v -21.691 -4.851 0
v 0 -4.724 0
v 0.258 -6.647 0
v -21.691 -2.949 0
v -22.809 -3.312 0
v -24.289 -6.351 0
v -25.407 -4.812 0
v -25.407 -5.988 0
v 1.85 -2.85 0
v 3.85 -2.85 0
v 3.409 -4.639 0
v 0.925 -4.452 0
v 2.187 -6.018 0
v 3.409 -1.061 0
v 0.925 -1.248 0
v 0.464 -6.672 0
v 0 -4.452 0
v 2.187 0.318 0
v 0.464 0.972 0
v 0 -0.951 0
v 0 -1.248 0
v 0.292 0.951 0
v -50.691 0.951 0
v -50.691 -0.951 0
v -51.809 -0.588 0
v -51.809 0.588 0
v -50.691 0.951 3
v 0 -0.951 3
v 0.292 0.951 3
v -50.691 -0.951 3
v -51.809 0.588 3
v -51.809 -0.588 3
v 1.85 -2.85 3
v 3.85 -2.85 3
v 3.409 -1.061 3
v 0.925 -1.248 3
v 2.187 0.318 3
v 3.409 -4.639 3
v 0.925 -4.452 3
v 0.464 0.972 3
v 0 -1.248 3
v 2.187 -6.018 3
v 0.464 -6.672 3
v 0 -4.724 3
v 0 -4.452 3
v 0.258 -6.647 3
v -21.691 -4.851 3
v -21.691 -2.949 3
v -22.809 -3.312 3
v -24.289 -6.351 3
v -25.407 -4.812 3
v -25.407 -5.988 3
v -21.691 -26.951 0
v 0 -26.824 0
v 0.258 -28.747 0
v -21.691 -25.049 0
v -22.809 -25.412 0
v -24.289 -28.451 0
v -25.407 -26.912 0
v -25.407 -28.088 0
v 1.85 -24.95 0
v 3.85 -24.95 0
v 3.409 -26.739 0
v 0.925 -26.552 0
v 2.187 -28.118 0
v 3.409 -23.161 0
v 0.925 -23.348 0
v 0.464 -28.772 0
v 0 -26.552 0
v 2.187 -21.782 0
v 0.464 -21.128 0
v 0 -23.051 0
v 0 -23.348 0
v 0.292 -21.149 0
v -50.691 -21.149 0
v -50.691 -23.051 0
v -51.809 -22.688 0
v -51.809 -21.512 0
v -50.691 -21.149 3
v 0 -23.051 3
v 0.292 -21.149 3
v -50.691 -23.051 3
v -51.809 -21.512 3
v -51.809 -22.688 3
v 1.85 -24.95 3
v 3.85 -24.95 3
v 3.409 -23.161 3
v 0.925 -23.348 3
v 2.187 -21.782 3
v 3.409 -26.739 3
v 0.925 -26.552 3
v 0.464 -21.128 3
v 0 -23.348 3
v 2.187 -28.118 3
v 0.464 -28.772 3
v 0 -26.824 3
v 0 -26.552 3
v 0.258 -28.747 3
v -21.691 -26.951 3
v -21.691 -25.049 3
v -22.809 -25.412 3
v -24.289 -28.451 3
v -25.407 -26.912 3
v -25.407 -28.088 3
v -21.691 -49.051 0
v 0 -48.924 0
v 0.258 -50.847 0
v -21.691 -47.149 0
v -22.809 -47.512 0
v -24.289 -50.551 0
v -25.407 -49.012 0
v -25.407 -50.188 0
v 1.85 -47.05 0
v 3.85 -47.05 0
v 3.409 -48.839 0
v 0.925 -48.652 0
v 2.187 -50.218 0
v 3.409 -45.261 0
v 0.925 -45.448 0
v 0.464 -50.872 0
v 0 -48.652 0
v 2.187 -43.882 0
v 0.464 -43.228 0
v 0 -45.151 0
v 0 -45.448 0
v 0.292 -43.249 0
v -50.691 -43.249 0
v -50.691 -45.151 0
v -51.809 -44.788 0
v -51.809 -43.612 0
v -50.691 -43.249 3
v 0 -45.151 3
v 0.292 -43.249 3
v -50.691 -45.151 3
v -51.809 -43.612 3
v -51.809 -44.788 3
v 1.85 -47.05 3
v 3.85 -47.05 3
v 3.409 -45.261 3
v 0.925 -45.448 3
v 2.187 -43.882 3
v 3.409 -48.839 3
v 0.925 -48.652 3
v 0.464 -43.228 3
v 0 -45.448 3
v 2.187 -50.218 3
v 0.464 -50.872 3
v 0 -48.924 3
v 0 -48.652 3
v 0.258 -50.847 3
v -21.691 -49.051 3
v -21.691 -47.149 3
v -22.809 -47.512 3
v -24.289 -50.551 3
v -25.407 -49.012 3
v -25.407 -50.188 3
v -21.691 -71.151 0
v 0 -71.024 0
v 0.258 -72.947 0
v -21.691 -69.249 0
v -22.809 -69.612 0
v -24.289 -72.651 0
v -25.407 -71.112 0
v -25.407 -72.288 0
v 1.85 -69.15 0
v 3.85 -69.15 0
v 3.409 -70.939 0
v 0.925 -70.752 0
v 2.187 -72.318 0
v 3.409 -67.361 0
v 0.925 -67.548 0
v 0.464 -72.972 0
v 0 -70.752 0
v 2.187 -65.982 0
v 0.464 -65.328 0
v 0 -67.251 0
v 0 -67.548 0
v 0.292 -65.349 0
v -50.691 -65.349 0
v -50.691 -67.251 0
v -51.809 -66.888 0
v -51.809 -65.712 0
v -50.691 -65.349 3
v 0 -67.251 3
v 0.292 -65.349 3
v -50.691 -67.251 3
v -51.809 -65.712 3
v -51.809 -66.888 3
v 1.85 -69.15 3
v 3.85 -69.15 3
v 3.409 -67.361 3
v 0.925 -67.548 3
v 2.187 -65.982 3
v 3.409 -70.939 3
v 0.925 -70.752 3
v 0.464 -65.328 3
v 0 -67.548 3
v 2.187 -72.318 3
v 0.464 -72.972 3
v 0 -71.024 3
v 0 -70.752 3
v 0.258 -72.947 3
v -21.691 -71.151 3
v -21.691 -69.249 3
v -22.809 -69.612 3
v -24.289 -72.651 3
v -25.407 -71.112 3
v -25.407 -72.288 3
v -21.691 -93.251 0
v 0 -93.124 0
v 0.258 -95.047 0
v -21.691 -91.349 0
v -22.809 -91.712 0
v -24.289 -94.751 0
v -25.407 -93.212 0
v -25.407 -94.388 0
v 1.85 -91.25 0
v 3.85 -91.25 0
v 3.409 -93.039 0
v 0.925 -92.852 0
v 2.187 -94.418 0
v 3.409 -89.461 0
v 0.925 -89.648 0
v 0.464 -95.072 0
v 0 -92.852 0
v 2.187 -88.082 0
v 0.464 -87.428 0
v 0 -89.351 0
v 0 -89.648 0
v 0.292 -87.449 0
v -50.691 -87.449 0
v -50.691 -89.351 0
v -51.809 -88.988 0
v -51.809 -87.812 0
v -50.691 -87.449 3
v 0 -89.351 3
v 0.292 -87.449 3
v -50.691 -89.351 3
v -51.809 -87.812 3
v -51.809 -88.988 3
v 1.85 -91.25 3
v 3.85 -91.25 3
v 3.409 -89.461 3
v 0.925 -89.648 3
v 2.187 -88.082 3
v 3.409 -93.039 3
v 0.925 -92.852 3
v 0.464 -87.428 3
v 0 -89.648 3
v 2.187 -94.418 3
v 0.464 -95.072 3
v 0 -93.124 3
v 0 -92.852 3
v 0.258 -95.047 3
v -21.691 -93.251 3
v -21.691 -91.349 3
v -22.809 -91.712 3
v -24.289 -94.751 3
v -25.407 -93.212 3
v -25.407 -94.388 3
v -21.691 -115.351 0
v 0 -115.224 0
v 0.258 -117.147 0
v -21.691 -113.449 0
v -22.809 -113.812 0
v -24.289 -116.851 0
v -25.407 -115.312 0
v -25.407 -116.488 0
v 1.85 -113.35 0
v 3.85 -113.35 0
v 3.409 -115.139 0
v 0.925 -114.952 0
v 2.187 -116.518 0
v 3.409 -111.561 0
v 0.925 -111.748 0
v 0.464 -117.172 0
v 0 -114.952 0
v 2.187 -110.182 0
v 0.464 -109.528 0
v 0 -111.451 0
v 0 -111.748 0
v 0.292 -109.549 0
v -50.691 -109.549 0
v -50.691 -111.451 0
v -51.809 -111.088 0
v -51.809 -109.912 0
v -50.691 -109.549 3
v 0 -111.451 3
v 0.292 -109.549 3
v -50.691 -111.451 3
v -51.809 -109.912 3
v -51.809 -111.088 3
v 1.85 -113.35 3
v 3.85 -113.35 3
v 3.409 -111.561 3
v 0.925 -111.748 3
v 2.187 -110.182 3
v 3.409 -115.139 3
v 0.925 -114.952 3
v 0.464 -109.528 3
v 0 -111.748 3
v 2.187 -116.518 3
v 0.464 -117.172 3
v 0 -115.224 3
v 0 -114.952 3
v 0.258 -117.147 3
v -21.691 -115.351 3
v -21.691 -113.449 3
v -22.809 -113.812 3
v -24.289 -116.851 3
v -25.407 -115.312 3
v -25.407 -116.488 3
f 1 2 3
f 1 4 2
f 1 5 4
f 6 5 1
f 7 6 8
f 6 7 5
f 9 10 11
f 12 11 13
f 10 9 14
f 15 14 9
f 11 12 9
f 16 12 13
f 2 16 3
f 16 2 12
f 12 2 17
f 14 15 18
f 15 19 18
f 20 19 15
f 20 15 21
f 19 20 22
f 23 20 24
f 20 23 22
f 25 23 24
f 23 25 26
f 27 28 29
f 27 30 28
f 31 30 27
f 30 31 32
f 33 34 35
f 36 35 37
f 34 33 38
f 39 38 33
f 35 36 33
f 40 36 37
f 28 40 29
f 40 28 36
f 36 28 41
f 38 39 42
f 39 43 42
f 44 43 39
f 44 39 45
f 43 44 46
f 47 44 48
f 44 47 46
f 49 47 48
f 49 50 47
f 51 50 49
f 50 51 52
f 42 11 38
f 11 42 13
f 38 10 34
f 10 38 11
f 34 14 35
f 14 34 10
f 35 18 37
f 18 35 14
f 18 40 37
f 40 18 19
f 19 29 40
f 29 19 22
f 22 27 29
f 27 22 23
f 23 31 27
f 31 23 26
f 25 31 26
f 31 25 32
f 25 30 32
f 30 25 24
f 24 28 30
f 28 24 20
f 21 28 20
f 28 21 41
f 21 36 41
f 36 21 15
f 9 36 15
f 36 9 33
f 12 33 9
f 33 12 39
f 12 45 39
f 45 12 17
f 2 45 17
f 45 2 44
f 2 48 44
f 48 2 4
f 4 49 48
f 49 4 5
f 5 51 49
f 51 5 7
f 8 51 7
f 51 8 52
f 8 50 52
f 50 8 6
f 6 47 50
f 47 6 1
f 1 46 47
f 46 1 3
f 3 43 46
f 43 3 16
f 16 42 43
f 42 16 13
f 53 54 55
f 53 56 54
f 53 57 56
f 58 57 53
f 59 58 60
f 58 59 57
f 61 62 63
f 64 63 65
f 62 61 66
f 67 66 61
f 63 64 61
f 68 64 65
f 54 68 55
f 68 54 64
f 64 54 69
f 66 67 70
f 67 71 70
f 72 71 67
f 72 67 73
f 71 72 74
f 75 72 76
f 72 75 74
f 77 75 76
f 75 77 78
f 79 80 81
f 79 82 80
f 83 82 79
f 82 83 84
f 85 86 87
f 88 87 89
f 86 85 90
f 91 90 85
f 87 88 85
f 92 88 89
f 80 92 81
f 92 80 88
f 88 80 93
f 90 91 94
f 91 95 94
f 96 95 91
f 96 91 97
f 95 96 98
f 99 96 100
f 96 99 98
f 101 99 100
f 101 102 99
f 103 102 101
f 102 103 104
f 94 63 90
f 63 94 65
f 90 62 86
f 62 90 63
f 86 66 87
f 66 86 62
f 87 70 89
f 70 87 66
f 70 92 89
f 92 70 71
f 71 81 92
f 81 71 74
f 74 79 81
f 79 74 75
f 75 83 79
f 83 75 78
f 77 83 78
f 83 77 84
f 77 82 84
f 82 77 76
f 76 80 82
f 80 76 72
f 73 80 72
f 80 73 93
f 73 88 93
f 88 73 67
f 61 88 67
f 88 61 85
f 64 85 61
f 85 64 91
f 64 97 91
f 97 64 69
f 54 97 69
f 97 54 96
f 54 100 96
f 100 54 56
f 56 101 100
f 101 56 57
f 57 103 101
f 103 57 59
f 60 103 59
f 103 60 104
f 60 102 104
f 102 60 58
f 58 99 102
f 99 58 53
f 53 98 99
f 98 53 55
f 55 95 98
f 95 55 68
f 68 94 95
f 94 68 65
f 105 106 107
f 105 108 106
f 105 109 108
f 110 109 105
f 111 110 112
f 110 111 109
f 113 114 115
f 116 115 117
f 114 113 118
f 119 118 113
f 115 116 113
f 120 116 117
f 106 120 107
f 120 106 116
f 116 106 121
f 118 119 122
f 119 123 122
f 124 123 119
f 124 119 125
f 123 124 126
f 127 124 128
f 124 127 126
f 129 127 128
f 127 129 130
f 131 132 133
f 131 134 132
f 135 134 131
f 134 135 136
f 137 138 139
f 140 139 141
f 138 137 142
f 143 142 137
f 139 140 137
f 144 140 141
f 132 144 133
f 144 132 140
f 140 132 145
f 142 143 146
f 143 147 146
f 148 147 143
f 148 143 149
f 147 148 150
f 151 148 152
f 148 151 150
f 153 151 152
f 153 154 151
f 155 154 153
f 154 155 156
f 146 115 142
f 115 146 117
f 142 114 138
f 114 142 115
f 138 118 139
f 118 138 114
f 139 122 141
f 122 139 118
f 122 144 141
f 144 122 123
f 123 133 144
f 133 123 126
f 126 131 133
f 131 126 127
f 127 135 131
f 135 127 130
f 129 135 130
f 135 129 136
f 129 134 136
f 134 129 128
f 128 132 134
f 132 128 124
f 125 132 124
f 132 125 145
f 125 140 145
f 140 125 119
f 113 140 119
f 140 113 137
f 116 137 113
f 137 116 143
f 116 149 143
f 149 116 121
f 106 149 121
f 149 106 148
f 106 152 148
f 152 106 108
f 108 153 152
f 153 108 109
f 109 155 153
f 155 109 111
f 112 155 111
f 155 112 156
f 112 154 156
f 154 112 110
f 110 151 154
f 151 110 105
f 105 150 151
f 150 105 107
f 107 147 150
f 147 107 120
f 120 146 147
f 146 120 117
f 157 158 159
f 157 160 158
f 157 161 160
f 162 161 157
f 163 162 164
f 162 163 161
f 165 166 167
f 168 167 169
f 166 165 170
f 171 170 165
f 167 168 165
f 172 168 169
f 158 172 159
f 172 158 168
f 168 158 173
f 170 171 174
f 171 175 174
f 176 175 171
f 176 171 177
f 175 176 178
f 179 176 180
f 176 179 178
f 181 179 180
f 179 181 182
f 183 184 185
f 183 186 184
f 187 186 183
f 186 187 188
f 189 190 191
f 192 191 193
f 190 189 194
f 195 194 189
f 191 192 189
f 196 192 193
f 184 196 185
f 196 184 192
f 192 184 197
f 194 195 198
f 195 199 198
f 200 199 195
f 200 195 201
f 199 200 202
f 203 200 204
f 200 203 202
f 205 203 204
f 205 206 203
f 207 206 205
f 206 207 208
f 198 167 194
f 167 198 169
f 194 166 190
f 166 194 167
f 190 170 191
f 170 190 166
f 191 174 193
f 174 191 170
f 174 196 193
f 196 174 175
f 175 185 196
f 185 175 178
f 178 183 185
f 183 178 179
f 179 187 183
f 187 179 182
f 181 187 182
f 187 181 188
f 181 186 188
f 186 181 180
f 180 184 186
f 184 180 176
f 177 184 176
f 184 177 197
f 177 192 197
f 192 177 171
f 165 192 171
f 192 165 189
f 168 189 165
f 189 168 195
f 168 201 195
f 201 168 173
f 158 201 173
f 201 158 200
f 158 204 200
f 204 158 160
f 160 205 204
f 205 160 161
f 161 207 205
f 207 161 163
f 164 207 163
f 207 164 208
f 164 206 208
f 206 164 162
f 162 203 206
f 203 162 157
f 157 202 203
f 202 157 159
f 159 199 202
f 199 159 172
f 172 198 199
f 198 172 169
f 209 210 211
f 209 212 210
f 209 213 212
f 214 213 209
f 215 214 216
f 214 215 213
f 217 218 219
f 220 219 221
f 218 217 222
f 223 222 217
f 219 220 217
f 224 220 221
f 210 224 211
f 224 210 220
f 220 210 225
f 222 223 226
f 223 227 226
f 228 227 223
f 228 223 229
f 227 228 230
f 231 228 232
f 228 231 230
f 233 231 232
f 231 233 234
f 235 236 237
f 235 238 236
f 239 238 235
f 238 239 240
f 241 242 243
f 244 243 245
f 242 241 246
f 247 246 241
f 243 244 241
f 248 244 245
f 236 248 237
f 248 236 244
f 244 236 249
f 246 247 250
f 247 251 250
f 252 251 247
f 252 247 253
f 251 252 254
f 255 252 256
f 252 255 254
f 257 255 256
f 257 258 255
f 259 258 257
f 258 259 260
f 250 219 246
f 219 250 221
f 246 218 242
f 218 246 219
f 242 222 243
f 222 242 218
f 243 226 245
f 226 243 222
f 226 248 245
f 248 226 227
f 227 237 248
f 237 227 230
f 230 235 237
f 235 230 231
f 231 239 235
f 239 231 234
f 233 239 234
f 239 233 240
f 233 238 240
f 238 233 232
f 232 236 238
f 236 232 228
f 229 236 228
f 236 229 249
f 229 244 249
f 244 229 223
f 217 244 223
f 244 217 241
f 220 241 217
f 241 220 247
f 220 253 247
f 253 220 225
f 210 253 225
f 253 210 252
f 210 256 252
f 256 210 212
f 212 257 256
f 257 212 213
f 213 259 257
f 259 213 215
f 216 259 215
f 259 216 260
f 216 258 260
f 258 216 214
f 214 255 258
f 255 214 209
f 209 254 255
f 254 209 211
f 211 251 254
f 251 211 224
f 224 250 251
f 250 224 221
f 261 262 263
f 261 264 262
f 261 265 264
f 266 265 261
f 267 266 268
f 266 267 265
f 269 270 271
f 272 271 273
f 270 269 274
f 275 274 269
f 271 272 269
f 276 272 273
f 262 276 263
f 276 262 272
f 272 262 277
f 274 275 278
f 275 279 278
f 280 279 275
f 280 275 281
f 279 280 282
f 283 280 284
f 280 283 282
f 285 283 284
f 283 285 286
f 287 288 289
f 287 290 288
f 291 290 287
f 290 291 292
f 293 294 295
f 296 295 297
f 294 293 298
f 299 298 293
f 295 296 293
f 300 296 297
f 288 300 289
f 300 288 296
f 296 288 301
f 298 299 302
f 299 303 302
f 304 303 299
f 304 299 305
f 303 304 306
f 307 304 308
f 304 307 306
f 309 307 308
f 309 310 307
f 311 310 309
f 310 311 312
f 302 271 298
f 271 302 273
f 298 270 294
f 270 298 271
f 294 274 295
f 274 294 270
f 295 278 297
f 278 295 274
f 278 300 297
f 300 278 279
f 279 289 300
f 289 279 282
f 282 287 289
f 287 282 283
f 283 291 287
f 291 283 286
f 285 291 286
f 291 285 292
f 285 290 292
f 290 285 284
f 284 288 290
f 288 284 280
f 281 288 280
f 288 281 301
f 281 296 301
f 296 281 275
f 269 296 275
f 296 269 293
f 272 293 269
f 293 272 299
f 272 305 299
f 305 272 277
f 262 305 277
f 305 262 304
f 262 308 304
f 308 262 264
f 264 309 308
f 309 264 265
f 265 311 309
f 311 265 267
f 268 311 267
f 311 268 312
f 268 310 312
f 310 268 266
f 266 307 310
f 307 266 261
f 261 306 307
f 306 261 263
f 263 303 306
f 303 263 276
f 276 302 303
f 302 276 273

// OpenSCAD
// ── MARCADORES DE COPO — NOME NA BORDA ──
// Peça plana numa só impressão: o nome assente numa barra que acaba num "U" (gancho).
// A barra do nome fica por fora do copo, o "U" passa por cima da borda e a perna curta fica
// por dentro, a apertar o vidro (a folga vai fechando do "U" para a ponta, que abre um pouco
// para entrar bem). O nome fica espetado para fora do copo, como uma barbatana.
// Até 12 nomes de uma vez, já arrumados na mesa.
//
// Parâmetros:
//   quantidade         1–12
//   nome_1 … nome_12   nomes; esc_nome_<i> (0–1) é calculado pelo servidor (lib/textFit.js,
//                      generation_schema.ajuste_texto) para o nome caber na largura
//   fonte, tamanho_nome (mm), largura (zona do nome, mm)
//   espessura          espessura da peça (mm)
//   espessura_vidro    espessura do vidro na borda do copo (mm)
//   modo               "corpo" (barra e gancho) | "nome" | "uma_peca" | "tudo"

function _q()     = is_undef(quantidade) ? 6 : max(1, min(12, round(quantidade)));
function _fonte() = is_undef(fonte) ? "Luckiest Guy" : fonte;
function _tam()   = is_undef(tamanho_nome) ? 8 : max(5, min(16, tamanho_nome));
function _larg()  = is_undef(largura) ? 45 : max(25, min(80, largura));
function _esp()   = is_undef(espessura) ? 3 : max(2, min(5, espessura));
function _vidro() = is_undef(espessura_vidro) ? 2.5 : max(1, min(6, espessura_vidro));
function _modo()  = is_undef(modo) ? "tudo" : modo;

function _nome(i) =
    i == 0 ? (is_undef(nome_1)  ? "" : nome_1)  : i == 1 ? (is_undef(nome_2)  ? "" : nome_2)  :
    i == 2 ? (is_undef(nome_3)  ? "" : nome_3)  : i == 3 ? (is_undef(nome_4)  ? "" : nome_4)  :
    i == 4 ? (is_undef(nome_5)  ? "" : nome_5)  : i == 5 ? (is_undef(nome_6)  ? "" : nome_6)  :
    i == 6 ? (is_undef(nome_7)  ? "" : nome_7)  : i == 7 ? (is_undef(nome_8)  ? "" : nome_8)  :
    i == 8 ? (is_undef(nome_9)  ? "" : nome_9)  : i == 9 ? (is_undef(nome_10) ? "" : nome_10) :
    i == 10 ? (is_undef(nome_11) ? "" : nome_11) : (is_undef(nome_12) ? "" : nome_12);
function _esc(i) =
    i == 0 ? (is_undef(esc_nome_1)  ? 1 : esc_nome_1)  : i == 1 ? (is_undef(esc_nome_2)  ? 1 : esc_nome_2)  :
    i == 2 ? (is_undef(esc_nome_3)  ? 1 : esc_nome_3)  : i == 3 ? (is_undef(esc_nome_4)  ? 1 : esc_nome_4)  :
    i == 4 ? (is_undef(esc_nome_5)  ? 1 : esc_nome_5)  : i == 5 ? (is_undef(esc_nome_6)  ? 1 : esc_nome_6)  :
    i == 6 ? (is_undef(esc_nome_7)  ? 1 : esc_nome_7)  : i == 7 ? (is_undef(esc_nome_8)  ? 1 : esc_nome_8)  :
    i == 8 ? (is_undef(esc_nome_9)  ? 1 : esc_nome_9)  : i == 9 ? (is_undef(esc_nome_10) ? 1 : esc_nome_10) :
    i == 10 ? (is_undef(esc_nome_11) ? 1 : esc_nome_11) : (is_undef(esc_nome_12) ? 1 : esc_nome_12);

W        = 2.0;    // largura da barra e do gancho (mm)
SOBRE    = 0.4;    // quanto as letras entram na barra (para ficarem agarradas)
PERNA    = 22;     // comprimento da perna de dentro (mm)
PONTA    = 3;      // aba da ponta, aberta para fora (mm)

// folgas (entre as faces de dentro): no "U" um pouco mais do que o vidro (a borda é
// arredondada), na ponta um pouco menos (para apertar)
function _gU()    = _vidro() + 1.2;
function _gP()    = max(0.6, _vidro() - 0.6);
function _rc()    = (_gU() + W) / 2;                  // raio da linha central do "U"
function _xi()    = -4 - _larg() - 2;                 // início da barra

module osso(a, b, r) { hull() { translate(a) circle(r); translate(b) circle(r); } }

module gancho2d() {
    rc = _rc();
    osso([_xi(), 0], [0, 0], W/2);                                    // barra do nome
    translate([0, -rc]) intersection() {                              // "U"
        difference() { circle(rc + W/2); circle(rc - W/2); }
        translate([0, -rc - W]) square([rc + W, 2*rc + 2*W]);
    }
    a = [0, -2*rc]; b = [-PERNA, -(_gP() + W)];                       // perna de dentro
    osso(a, b, W/2);
    osso(b, b + [-PONTA*cos(30), -PONTA*sin(30)], W/2);              // ponta aberta
}

module texto2d(i) {
    text(_nome(i), size=_tam()*_esc(i), font=_fonte(), halign="center", valign="baseline");
}

// Medidas das fontes do servidor (fração do size do OpenSCAD), feitas com o opentype.js:
//   [fonte, limiar, esticão, base]
//   limiar  = topo da maiúscula mais alta + 0.01 — o que fica acima disto são acentos
//   esticão = maior distância acento→letra + 0.06: os acentos (Ã, É, Ê, Ó…) ficariam soltos e
//             sairiam como bocadinhos separados, por isso a parte acima do limiar é "esticada" para
//             baixo até entrar um pouco na letra (o topo das letras fica abaixo do limiar e os
//             buracos do O/A/B não enchem)
//   base    = quanto a letra mais "levantada" fica acima da linha de base (Luckiest Guy salta)
// Para acrescentar uma fonte: medir com scripts/medir_fontes_borda.mjs e juntar aqui e no select.
FONTES = [
    ["Luckiest Guy", 1.015, 0.162, 0.066],
    ["Anton", 1.214, 0.135, 0.001],
    ["Sigmar One", 0.984, 0.153, 0.006],
    ["Oswald", 1.15, 0.185, 0],
    ["Racing Sans One", 0.906, 0.164, 0],
    ["Baloo 2", 0.875, 0.15, 0],
    ["Chewy", 1.072, 0.156, 0],
    ["Pacifico", 1.228, 0.156, 0],
    ["Lobster", 1.061, 0.156, 0],
    ["Aladin", 1.025, 0.122, 0],
    ["Amarante", 1.095, 0.179, 0],
    ["Press Start 2P", 1.399, 0, 0.174],
    ["Open Sans", 1.017, 0.161, 0.001]];
function _fm() = let(m = [for (a = FONTES) if (a[0] == _fonte()) a]) len(m) ? m[0] : ["", 1.02, 0.19, 0.07];

module nome2d(i) {
    s = _tam()*_esc(i); a = _fm();
    if (_nome(i) != "")
        translate([_xi() + 2 + _larg()/2, W/2 - SOBRE - a[3]*s]) intersection() {
          // nada passa para baixo da barra (é o lado do vidro): corta a cedilha do Ç e as pernas do g/p/j
          translate([-500, -W + SOBRE + a[3]*s]) square([1000, 100]);
          offset(delta=0.01) union() {
            texto2d(i);
            minkowski() {
                intersection() { texto2d(i); translate([-500, a[1]*s]) square([1000, 2*s]); }
                translate([-0.01, -a[2]*s]) square([0.02, a[2]*s]);
            }
          }
        }
}

module corpo1()  { linear_extrude(_esp()) gancho2d(); }
module nome1(i)  { linear_extrude(_esp()) difference() { nome2d(i); gancho2d(); } }
module junto1(i) { linear_extrude(_esp()) union() { gancho2d(); nome2d(i); } }   // uma só peça, letras agarradas à barra

// ---------- arrumação na mesa (em coluna, como na foto; duas colunas a partir de 7) ----------
function _porcol() = _q() > 6 ? ceil(_q() / 2) : _q();
function _passoY() = _tam()*1.55 + 2*_rc() + W + 2;   // 1.55: acentos altos (Anton, Press Start)
function _passoX() = _larg() + 6 + 2*_rc() + W + 8;
function pos(i) = [floor(i / _porcol()) * _passoX(), -(i % _porcol()) * _passoY()];

if (_modo() == "corpo")
    for (i=[0:_q()-1]) translate(pos(i)) corpo1();
if (_modo() == "nome")
    for (i=[0:_q()-1]) translate(pos(i)) nome1(i);
if (_modo() == "uma_peca" || _modo() == "tudo")
    for (i=[0:_q()-1]) translate(pos(i)) junto1(i);
